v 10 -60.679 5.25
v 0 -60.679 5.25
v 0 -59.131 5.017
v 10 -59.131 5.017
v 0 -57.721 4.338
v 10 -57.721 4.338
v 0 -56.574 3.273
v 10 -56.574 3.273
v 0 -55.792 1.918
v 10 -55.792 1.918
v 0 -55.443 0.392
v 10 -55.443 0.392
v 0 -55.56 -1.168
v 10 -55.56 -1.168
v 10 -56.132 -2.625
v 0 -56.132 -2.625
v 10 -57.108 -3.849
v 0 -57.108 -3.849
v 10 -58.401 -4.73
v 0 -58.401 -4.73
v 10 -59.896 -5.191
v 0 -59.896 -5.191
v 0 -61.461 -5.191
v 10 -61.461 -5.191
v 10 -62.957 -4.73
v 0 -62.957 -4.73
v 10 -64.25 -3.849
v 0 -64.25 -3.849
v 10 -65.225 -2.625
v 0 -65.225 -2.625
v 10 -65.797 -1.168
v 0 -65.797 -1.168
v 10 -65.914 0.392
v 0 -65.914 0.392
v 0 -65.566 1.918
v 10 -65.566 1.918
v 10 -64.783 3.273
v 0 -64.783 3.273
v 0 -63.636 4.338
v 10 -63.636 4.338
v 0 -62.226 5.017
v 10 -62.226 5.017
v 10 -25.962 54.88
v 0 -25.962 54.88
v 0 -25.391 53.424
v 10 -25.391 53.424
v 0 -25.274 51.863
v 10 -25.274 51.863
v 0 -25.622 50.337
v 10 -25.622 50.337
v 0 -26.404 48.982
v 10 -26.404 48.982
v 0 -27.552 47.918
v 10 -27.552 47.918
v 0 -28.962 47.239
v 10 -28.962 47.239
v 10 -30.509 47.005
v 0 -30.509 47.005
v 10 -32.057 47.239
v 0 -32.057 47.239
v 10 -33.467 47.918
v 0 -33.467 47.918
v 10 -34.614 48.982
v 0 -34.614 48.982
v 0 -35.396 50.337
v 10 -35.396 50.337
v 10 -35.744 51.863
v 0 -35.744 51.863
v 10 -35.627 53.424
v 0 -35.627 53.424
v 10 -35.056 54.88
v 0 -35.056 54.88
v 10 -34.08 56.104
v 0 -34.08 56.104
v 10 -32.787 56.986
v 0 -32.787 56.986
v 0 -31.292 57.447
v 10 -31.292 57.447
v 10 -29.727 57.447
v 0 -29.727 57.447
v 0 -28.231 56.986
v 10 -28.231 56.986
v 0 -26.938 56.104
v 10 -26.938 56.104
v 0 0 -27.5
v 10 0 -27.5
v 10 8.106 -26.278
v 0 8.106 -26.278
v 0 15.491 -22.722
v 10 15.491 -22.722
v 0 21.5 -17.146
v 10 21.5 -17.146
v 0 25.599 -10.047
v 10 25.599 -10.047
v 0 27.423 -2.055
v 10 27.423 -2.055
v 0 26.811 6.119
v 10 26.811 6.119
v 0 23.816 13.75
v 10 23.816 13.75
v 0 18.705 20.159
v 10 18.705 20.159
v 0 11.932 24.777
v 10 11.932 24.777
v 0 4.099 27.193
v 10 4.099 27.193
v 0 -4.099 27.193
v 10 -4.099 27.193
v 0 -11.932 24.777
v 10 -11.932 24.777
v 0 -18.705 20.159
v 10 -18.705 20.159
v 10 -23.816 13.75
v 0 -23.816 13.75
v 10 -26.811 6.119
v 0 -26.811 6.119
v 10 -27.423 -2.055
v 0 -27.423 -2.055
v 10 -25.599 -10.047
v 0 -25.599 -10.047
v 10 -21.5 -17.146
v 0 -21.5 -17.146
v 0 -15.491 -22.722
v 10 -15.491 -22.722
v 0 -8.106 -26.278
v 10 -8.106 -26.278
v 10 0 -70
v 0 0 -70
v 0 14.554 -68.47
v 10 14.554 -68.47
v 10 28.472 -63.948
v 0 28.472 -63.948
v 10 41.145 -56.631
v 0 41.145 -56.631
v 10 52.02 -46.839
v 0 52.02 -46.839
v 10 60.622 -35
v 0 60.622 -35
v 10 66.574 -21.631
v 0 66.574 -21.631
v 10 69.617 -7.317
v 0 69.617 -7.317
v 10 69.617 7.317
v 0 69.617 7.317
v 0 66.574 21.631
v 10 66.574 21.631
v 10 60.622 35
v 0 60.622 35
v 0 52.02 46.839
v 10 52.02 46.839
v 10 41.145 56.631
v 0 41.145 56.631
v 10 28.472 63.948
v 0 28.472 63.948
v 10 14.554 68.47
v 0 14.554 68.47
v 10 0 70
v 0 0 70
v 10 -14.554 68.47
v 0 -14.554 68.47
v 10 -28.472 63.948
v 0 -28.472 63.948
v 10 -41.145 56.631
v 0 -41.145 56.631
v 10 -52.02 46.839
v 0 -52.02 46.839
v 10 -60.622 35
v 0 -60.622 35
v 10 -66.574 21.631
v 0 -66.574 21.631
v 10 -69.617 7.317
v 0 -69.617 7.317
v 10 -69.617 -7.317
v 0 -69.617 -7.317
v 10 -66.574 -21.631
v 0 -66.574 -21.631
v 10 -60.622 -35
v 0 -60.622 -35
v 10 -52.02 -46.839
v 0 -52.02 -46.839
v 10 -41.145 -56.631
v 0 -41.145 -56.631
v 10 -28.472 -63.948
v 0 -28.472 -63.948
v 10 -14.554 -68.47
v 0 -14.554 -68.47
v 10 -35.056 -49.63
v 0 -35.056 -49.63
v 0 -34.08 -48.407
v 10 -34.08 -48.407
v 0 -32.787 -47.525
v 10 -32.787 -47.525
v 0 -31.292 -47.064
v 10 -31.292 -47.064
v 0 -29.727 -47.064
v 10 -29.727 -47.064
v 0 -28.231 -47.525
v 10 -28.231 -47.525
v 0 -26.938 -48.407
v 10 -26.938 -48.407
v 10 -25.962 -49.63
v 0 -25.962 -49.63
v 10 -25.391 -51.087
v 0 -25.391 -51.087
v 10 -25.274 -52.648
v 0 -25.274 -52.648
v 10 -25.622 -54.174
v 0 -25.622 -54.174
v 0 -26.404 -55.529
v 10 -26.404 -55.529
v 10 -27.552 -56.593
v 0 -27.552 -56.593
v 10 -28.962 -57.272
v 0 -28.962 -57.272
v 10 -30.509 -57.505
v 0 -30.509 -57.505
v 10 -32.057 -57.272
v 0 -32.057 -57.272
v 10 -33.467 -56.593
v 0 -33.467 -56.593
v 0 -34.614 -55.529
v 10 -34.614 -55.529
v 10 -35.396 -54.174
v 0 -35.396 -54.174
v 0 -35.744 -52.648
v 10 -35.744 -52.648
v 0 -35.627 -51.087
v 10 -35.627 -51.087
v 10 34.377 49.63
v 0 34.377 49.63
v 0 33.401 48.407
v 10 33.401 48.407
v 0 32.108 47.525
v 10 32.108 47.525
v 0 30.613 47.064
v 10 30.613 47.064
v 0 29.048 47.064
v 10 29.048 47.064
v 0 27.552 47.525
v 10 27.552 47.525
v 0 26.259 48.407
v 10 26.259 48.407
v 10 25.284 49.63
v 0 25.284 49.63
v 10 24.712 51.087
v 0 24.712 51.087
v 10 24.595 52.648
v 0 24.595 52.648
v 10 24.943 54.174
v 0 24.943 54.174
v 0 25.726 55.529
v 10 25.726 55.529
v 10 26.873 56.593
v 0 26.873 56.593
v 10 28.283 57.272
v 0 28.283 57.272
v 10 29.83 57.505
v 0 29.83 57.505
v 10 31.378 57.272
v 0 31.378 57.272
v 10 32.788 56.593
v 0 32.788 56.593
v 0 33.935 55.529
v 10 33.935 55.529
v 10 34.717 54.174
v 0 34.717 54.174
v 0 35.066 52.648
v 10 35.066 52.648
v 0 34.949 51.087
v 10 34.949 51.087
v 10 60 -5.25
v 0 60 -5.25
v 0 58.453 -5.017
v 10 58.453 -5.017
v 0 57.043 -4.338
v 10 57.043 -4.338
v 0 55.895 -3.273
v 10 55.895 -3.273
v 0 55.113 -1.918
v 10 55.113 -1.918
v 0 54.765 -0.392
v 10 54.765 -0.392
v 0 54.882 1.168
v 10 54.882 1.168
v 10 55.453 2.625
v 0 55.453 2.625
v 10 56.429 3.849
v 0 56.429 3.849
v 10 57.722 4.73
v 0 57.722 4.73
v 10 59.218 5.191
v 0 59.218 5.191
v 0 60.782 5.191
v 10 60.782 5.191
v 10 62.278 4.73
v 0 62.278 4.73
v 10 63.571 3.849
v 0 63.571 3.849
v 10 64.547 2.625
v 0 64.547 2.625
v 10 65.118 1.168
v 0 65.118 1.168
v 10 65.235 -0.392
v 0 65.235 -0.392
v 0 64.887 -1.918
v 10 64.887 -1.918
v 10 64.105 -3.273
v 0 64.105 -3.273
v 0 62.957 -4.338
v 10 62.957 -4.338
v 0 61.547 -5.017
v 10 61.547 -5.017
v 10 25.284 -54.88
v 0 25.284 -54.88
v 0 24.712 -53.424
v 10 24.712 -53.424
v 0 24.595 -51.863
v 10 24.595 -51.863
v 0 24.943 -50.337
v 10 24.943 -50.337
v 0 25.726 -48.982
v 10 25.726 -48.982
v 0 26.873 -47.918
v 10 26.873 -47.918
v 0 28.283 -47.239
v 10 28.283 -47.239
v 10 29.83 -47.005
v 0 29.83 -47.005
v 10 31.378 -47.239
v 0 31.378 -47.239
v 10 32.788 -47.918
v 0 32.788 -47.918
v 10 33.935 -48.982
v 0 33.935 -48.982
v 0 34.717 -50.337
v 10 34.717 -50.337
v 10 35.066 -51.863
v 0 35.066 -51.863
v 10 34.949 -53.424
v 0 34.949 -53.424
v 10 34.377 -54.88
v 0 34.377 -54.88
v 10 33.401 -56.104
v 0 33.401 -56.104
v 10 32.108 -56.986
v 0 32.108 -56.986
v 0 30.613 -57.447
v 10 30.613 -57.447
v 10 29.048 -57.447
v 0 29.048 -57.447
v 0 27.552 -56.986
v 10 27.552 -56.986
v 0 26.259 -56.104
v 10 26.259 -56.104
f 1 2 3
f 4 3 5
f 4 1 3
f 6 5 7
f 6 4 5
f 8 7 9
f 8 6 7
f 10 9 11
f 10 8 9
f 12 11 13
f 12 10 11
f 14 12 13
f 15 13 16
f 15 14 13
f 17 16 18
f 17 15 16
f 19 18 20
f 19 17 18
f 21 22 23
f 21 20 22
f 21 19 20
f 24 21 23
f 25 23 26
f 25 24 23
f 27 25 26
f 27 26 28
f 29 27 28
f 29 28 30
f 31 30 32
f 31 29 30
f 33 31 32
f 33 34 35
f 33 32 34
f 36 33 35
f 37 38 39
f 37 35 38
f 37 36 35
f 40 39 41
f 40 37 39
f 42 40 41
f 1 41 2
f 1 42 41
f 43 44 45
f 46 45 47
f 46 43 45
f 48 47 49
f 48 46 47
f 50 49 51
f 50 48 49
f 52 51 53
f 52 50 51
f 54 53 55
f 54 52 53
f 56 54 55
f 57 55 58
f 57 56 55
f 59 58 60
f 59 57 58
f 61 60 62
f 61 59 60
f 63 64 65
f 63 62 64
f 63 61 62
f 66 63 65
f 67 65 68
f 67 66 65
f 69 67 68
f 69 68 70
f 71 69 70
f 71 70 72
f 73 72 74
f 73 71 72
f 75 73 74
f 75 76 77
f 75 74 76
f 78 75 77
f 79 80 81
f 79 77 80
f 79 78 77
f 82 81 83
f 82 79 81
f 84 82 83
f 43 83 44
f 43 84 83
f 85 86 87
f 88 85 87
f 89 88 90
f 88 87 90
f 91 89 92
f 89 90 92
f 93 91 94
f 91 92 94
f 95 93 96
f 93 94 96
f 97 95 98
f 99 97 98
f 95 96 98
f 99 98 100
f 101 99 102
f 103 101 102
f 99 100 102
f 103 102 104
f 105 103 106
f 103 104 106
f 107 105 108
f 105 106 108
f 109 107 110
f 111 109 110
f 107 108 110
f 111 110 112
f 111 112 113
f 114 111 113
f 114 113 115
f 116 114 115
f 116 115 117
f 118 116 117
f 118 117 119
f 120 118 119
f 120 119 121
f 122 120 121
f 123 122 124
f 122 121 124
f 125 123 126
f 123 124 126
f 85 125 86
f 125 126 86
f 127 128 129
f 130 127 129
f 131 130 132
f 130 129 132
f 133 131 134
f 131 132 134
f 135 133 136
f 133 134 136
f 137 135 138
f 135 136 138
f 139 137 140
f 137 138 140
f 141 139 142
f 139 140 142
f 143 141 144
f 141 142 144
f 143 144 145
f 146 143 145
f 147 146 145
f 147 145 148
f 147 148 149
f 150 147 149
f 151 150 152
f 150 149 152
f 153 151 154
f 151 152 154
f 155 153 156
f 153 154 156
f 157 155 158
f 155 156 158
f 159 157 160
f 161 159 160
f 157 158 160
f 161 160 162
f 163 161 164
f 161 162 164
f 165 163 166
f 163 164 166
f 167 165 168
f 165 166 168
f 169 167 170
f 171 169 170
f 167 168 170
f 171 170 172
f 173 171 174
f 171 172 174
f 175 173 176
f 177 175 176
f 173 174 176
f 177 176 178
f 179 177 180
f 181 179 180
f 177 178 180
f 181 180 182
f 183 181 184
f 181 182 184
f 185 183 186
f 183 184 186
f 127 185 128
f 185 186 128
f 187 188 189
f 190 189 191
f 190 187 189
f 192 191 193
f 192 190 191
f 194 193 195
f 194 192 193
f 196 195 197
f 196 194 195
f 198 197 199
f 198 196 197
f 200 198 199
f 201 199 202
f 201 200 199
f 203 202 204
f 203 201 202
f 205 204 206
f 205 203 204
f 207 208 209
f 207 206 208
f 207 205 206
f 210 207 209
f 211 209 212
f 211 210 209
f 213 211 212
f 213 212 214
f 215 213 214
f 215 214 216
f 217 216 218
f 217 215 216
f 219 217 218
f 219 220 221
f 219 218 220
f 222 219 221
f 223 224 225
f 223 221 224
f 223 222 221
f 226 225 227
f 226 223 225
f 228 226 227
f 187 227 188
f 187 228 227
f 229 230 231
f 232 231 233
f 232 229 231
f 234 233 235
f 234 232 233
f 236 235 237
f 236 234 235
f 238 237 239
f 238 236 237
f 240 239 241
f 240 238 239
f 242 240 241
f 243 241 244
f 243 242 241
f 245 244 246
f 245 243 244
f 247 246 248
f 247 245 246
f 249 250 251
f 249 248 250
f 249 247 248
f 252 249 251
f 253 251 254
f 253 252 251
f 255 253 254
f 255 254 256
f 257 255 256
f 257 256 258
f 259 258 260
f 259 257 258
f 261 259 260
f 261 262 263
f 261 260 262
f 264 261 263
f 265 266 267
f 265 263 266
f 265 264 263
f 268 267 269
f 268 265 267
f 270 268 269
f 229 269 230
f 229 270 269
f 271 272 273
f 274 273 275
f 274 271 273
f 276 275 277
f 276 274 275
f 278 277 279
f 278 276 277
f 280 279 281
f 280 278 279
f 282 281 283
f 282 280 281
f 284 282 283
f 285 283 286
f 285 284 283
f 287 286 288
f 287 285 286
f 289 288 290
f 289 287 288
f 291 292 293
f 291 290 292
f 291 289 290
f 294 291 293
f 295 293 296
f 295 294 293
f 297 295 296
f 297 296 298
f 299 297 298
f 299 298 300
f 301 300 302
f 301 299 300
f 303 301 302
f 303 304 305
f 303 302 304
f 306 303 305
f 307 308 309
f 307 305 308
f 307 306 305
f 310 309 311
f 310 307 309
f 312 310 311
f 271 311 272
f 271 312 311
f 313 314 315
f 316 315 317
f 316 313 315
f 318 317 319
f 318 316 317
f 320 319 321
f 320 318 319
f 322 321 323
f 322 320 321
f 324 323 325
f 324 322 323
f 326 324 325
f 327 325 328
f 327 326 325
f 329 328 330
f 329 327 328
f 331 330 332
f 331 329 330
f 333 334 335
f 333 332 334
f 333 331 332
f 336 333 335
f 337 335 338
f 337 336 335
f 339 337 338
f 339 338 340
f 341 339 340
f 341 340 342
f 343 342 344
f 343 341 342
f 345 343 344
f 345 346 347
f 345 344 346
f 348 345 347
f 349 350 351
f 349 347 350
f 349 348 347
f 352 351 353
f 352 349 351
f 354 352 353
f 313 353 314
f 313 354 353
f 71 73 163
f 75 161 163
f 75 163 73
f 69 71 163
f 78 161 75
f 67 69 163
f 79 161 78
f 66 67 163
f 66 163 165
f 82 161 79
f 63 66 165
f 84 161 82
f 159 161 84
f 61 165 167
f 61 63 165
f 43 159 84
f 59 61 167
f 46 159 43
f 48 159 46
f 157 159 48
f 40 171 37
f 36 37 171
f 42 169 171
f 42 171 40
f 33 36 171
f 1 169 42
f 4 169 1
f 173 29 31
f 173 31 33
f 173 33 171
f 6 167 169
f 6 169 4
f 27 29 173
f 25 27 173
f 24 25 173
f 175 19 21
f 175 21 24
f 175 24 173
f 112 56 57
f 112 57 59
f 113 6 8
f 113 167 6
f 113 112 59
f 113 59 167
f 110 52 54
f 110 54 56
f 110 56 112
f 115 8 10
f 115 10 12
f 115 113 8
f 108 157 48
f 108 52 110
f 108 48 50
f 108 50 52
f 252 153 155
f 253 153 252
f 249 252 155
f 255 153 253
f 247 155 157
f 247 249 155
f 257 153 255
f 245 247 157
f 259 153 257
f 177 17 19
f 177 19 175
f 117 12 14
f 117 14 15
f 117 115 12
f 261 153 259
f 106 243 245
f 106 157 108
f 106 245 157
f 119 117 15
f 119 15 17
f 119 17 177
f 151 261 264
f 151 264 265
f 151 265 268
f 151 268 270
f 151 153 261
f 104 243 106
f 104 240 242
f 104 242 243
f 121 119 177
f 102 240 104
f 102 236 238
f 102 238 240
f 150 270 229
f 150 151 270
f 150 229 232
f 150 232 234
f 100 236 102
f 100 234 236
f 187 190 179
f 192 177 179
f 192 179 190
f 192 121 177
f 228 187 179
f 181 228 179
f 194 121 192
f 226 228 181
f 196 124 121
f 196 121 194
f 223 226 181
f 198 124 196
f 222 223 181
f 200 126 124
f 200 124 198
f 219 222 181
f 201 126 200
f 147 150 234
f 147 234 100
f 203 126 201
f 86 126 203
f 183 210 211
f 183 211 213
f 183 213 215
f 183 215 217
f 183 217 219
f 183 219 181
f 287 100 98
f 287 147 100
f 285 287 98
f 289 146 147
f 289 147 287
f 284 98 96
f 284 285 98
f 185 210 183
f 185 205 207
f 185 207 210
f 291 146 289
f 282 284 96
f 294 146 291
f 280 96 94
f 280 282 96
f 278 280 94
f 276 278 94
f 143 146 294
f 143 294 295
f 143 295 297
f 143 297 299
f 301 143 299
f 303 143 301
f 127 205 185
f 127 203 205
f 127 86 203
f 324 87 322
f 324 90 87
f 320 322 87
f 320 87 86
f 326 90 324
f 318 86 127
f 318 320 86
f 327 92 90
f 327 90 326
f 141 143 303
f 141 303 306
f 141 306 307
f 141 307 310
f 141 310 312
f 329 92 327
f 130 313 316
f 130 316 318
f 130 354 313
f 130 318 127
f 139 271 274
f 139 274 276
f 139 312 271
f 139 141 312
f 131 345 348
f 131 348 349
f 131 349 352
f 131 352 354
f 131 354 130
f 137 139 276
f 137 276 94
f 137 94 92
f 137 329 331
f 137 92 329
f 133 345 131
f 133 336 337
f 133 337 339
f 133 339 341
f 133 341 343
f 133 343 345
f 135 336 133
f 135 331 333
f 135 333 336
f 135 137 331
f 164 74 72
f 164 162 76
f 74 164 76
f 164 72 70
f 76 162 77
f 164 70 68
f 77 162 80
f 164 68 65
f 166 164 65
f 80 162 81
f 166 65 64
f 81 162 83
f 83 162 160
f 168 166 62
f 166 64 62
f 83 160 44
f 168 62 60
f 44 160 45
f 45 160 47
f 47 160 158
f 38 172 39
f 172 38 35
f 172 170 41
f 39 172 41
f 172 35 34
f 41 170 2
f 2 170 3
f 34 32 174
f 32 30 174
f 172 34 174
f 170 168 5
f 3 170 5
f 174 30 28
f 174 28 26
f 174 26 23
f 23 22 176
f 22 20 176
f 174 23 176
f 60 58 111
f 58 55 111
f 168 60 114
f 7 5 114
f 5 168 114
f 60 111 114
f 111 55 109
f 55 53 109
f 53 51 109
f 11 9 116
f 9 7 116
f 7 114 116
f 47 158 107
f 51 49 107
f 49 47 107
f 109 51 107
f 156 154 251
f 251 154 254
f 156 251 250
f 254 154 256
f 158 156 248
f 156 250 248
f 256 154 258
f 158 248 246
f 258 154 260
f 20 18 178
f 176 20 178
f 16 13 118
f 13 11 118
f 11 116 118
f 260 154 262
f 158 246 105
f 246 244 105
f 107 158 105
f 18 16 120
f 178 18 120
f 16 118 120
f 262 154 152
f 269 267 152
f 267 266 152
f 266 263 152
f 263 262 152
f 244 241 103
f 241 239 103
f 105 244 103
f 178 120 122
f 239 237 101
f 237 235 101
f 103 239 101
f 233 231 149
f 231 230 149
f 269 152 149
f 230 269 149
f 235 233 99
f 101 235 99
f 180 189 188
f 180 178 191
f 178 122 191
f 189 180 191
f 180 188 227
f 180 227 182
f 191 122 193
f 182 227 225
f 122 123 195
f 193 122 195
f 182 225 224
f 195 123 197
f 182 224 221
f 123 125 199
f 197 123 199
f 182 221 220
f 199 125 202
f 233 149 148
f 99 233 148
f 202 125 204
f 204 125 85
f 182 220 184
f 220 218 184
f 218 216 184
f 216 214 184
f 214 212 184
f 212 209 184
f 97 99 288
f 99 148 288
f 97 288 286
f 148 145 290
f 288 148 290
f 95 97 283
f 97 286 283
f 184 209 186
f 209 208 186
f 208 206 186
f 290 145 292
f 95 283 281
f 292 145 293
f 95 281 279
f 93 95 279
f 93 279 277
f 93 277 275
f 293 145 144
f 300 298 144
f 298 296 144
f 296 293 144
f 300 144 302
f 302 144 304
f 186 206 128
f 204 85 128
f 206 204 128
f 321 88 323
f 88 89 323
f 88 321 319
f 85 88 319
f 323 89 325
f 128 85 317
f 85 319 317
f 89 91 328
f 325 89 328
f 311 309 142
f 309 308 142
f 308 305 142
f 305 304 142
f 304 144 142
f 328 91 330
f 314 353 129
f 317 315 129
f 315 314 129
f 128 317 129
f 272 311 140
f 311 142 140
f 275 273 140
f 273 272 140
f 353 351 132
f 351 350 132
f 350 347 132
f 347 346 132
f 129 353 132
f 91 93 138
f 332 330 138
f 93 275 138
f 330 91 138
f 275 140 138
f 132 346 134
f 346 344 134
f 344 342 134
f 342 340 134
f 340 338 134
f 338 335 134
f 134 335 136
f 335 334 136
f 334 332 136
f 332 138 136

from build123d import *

# Parameters (mm, degrees)
CROQUIS1_R              = 70
SALIENTE_EXTRUIR1_DEPTH = 10
MATRIZC5_COUNT          = 6
CROQUIS9_R              = 27.5
CORTAR_EXTRUIR1_DEPTH   = 10


with BuildPart() as part:
    # Croquis1 → Saliente-Extruir1 (new body)
    with BuildSketch(Plane(origin=(0, 0, 0), x_dir=(0, 0, -1), z_dir=(1, 0, 0))):
        Circle(CROQUIS1_R)
    extrude(amount=SALIENTE_EXTRUIR1_DEPTH)

    # Croquis8 → Taladro roscado M12x1.51 (revolve, cut)
    with BuildSketch(Plane(origin=(10, 60, 0), x_dir=(0, 0, -1), z_dir=(0, 1, 0))):
        Polygon((0, 0), (0, 34.65451825), (5.25, 31.5), (5.25, 0), align=None)
    taladro_roscado_m12x1_51 = revolve(axis=Axis((16.35, 60, 0), (-1, 0, 0)), mode=Mode.SUBTRACT)

    # MatrizC5: Taladro roscado M12x1.51 ×6 about axis
    matrizc5_axis = Axis((0, -0.339409177, 0), (1, 0, 0))
    for i in range(1, MATRIZC5_COUNT):
        add(taladro_roscado_m12x1_51.rotate(matrizc5_axis, i * 360 / MATRIZC5_COUNT), mode=Mode.SUBTRACT)

    # Croquis9 → Cortar-Extruir1 (cut)
    with BuildSketch(Plane(origin=(10, 0, 0), x_dir=(0, 0, -1), z_dir=(1, 0, 0))):
        Circle(CROQUIS9_R)
    extrude(amount=-CORTAR_EXTRUIR1_DEPTH, mode=Mode.SUBTRACT)


solid = part.part
